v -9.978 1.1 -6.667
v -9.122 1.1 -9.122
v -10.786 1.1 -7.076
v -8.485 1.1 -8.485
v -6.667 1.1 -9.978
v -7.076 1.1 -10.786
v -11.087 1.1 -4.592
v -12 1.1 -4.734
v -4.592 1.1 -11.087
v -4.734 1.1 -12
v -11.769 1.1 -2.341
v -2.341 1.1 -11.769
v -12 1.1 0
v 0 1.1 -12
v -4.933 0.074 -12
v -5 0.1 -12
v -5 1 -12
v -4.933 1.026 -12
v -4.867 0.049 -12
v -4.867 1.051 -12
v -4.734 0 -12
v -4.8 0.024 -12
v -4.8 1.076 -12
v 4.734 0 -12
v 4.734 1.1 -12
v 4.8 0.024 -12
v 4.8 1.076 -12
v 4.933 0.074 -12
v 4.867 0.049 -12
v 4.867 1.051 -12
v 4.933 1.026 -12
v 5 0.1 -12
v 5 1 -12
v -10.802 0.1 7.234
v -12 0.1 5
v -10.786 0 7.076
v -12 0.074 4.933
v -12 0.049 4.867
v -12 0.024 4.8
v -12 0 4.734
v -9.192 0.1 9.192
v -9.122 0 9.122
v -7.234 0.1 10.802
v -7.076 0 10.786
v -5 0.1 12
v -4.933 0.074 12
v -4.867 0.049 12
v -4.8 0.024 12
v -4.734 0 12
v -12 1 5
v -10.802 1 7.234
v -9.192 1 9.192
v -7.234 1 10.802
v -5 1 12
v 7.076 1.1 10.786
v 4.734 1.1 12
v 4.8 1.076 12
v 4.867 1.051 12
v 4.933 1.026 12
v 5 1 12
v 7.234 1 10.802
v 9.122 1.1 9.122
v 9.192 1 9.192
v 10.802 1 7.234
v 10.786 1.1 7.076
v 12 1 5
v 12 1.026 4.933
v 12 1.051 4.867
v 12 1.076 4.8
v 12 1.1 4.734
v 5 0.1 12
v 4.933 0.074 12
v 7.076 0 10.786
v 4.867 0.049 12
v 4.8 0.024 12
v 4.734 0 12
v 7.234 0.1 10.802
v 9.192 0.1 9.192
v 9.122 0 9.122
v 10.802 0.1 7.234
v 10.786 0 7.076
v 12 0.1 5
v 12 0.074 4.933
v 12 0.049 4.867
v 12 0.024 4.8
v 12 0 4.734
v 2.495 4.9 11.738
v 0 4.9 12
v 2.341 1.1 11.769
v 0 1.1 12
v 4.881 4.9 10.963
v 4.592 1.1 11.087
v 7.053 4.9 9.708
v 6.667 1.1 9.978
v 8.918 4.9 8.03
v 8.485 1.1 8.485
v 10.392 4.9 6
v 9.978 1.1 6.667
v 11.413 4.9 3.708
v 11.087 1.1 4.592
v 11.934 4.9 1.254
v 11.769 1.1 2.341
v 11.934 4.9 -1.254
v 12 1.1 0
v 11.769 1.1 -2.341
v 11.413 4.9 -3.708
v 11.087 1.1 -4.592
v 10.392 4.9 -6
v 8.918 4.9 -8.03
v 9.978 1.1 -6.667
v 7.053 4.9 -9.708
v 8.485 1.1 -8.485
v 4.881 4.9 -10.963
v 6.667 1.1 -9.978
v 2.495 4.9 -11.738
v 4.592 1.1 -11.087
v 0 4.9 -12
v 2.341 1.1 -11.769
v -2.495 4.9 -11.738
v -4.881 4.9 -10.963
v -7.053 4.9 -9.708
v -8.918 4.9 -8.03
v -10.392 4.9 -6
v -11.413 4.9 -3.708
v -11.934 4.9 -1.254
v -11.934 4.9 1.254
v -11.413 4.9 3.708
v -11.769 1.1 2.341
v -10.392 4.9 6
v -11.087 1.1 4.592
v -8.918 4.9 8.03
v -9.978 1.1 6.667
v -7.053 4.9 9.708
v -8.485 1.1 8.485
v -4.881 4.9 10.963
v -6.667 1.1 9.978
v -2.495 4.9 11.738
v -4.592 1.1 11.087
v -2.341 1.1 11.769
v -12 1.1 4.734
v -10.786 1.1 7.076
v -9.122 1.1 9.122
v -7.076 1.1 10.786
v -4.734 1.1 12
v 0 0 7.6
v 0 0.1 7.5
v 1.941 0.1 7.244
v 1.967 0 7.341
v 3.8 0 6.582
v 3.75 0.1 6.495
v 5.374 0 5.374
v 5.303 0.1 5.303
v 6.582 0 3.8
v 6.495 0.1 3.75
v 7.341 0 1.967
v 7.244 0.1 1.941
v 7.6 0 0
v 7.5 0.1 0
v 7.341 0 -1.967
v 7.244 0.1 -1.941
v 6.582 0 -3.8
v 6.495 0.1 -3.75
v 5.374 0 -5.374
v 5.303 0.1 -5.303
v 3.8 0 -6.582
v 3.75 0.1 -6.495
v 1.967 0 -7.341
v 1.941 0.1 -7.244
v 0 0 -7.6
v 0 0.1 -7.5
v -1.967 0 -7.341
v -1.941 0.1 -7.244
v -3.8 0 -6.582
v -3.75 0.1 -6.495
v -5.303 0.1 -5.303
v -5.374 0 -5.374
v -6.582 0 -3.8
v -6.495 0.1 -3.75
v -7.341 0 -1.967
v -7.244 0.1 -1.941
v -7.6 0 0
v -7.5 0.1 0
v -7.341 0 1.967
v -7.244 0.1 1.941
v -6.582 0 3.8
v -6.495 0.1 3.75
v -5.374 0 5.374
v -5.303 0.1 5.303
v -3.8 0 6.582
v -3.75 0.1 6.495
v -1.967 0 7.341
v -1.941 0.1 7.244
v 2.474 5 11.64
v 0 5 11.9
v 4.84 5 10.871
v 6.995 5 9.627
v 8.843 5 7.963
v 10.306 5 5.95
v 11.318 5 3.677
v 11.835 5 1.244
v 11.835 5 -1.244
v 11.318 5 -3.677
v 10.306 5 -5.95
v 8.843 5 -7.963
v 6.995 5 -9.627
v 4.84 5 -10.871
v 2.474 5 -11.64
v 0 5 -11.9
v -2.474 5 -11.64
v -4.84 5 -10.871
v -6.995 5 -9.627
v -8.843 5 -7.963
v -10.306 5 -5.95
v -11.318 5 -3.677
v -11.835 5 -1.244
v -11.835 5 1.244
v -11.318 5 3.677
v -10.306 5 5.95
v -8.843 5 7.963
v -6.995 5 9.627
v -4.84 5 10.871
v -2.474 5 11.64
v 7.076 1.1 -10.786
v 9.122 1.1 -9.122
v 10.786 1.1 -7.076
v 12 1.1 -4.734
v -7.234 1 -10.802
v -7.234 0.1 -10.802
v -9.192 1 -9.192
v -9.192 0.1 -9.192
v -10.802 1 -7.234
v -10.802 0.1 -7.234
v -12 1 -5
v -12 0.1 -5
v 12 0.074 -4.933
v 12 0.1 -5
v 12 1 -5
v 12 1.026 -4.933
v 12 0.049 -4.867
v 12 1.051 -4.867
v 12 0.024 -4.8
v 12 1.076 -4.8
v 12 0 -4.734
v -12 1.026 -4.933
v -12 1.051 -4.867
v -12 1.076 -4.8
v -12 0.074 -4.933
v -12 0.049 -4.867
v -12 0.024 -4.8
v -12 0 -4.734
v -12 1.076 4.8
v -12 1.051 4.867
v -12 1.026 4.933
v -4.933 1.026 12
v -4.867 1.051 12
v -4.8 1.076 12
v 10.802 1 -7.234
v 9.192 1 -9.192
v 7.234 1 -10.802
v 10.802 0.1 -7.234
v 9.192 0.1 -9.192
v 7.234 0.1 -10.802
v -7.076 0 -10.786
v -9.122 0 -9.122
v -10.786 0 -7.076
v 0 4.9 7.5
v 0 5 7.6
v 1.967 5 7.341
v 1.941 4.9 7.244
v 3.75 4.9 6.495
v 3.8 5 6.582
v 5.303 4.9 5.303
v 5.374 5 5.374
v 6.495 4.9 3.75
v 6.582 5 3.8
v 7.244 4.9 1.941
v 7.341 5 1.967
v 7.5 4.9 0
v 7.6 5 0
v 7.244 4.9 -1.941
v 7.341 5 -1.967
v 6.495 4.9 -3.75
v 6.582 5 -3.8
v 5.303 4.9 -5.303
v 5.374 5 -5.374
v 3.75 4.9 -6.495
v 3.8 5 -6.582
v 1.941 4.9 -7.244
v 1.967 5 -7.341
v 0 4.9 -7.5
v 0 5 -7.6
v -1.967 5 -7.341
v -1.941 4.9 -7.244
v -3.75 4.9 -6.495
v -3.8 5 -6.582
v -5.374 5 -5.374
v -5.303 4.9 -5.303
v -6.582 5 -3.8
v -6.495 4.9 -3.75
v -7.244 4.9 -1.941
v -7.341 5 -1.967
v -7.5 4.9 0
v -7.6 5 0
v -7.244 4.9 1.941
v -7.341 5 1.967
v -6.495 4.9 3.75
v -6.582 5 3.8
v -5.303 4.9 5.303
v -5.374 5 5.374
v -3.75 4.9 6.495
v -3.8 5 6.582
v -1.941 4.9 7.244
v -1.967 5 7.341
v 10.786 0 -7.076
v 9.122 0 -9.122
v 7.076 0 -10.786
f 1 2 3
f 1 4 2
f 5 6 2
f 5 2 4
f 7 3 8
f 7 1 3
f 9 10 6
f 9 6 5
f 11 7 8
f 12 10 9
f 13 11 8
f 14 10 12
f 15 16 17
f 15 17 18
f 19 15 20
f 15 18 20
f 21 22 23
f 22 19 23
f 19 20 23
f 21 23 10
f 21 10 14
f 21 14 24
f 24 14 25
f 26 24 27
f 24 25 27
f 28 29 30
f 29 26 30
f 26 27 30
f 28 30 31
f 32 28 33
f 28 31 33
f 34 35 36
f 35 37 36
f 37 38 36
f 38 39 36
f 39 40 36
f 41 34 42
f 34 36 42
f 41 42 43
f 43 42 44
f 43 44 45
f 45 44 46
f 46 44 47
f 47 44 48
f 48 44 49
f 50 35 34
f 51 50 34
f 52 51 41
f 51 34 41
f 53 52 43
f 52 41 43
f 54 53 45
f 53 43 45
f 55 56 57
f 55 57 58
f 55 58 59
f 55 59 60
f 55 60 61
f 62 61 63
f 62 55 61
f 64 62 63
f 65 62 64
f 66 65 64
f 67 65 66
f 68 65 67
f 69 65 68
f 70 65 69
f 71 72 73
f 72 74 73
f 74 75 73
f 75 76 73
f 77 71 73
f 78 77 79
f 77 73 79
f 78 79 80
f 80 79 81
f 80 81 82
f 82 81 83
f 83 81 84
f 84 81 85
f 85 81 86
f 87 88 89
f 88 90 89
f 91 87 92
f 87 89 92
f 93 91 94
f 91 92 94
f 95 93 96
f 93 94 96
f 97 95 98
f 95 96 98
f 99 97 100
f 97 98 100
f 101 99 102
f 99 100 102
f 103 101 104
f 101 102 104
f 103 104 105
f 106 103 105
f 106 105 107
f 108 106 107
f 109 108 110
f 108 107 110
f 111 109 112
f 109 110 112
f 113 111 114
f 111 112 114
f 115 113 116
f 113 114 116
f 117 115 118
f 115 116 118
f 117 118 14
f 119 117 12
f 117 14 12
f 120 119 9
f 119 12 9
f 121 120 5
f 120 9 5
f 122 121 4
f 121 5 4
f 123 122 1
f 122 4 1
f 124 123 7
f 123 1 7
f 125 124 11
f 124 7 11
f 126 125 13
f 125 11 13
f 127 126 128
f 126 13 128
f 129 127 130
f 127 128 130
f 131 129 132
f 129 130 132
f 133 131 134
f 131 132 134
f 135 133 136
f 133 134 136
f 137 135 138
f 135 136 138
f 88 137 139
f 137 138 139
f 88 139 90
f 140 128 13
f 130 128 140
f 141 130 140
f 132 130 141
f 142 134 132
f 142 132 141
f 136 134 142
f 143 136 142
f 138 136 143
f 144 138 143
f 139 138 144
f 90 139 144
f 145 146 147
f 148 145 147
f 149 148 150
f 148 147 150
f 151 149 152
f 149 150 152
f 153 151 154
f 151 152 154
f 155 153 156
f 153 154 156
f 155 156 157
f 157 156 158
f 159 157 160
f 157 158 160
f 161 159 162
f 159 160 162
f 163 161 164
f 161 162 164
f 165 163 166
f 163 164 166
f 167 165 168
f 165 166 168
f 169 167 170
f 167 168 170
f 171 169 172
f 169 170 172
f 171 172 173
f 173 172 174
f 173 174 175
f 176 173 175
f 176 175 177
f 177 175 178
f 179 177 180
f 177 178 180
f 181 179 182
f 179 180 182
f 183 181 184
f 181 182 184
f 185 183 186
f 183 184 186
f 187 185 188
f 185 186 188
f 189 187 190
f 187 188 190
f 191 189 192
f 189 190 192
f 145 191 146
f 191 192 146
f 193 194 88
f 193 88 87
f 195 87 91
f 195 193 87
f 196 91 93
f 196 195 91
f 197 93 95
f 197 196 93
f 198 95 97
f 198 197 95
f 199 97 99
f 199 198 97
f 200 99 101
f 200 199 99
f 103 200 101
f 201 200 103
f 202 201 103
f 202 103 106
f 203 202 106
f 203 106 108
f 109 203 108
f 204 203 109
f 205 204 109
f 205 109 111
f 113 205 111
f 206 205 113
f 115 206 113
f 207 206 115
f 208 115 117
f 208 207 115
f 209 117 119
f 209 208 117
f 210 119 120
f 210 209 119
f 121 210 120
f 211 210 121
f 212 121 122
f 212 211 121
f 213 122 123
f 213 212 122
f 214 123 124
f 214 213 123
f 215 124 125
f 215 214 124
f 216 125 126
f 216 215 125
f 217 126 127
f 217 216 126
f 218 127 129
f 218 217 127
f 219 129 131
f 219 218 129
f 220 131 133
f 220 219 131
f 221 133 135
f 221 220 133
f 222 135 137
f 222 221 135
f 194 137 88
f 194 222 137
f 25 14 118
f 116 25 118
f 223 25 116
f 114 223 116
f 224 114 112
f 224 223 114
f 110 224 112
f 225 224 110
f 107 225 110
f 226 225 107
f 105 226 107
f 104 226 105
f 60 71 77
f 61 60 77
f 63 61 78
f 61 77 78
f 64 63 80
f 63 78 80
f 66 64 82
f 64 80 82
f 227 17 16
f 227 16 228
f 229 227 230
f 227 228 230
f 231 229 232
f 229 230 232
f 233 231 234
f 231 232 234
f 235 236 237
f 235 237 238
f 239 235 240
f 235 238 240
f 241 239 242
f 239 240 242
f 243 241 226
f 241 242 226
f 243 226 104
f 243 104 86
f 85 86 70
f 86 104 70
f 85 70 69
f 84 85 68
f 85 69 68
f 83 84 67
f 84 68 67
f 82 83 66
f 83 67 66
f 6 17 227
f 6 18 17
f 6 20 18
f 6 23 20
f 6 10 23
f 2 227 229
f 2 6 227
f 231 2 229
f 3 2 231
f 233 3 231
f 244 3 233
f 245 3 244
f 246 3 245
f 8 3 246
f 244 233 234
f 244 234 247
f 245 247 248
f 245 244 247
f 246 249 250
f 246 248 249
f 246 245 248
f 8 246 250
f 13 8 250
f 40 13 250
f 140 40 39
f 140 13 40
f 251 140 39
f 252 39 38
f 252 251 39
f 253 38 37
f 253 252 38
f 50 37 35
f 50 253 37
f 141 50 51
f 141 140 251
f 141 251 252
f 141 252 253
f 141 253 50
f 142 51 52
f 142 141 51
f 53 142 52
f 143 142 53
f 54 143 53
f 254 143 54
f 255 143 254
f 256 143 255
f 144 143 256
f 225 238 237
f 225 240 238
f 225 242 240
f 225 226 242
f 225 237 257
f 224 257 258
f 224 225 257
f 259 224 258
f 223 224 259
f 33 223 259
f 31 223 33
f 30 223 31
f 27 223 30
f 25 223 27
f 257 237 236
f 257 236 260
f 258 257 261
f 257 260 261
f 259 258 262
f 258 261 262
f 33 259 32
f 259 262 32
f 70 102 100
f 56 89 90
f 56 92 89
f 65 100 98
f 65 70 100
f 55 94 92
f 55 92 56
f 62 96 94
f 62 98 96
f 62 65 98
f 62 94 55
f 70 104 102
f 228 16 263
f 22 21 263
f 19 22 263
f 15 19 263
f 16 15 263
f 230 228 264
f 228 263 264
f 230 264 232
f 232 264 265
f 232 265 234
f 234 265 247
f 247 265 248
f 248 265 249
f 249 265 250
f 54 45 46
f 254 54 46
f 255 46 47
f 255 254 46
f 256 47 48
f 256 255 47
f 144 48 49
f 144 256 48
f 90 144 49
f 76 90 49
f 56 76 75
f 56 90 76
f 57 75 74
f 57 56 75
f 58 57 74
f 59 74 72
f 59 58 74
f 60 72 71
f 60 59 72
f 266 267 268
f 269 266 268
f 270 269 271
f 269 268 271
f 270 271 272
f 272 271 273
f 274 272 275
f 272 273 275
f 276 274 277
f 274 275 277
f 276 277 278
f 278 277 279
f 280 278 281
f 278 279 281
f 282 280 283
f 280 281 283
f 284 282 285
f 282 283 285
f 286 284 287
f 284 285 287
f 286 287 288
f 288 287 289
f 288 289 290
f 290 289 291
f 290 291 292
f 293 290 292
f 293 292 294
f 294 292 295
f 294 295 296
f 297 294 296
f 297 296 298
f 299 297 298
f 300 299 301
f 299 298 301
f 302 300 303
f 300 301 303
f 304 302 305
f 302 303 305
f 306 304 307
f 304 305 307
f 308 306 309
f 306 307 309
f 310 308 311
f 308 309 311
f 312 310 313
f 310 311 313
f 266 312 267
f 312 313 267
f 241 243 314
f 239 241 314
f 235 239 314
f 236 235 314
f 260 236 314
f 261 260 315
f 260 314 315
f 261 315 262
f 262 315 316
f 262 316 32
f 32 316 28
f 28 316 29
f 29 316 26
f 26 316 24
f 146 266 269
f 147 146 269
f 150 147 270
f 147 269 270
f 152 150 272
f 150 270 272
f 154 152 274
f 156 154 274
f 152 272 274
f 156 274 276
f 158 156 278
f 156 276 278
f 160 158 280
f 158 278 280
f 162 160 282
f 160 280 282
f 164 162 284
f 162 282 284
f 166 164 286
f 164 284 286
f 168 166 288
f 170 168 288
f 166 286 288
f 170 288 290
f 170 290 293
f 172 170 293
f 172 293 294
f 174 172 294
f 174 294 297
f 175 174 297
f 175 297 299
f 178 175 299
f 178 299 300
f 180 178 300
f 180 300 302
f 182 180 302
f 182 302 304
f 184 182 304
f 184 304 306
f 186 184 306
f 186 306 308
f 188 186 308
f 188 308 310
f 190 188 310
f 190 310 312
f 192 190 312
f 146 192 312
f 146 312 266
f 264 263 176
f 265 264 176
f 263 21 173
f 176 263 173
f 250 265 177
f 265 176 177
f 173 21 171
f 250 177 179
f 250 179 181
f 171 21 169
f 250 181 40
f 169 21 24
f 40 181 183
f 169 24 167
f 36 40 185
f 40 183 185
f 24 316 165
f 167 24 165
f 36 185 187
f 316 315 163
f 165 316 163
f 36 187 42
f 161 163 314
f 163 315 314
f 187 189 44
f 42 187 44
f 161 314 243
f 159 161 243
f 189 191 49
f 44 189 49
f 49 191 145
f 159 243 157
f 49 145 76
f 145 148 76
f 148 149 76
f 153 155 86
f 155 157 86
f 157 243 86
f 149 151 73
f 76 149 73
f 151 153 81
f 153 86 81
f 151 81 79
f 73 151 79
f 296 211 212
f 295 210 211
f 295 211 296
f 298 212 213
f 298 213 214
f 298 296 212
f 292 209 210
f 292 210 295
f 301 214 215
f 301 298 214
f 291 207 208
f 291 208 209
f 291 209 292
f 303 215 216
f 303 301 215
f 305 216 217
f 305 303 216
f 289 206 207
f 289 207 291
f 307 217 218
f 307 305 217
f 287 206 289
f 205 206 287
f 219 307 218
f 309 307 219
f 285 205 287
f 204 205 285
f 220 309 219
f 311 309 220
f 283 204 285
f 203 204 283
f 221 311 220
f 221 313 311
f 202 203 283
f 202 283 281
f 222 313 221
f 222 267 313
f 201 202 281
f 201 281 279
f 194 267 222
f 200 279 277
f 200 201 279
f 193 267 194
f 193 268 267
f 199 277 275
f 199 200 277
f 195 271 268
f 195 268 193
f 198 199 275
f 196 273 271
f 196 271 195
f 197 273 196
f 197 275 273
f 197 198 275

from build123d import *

# Parameters (mm, degrees)
SKETCH_1_R          = 13
EXTRUDE_1_DEPTH     = 1.1
SKETCH_2_R          = 12
EXTRUDE_2_DEPTH     = 3.9
SKETCH_3_R          = 7.5
CUT_EXTRUDE_1_DEPTH = 20.052558883
CHAMFER_1_SIZE      = 0.1
CUT_EXTRUDE_2_DEPTH = 19.793881983


with BuildPart() as part:
    # 草图1 → 凸台-拉伸1 (new body)
    with BuildSketch(Plane(origin=(0, 0, 0), x_dir=(1, 0, 0), z_dir=(0, 1, 0))):
        with Locations(Location((0, 0, 0), (0, 0, 270))):
            Circle(SKETCH_1_R)
    extrude(amount=EXTRUDE_1_DEPTH)

    # 草图2 → 凸台-拉伸2 (add)
    with BuildSketch(Plane(origin=(0, 1.1, 0), x_dir=(1, 0, 0), z_dir=(0, 1, 0))):
        with Locations(Location((0, 0, 0), (0, 0, 270))):
            Circle(SKETCH_2_R)
    extrude(amount=EXTRUDE_2_DEPTH)

    # 草图3 → 切除-拉伸1 (cut, through all)
    with BuildSketch(Plane(origin=(0, 5, 0), x_dir=(1, 0, 0), z_dir=(0, 1, 0))):
        with Locations(Location((0, 0, 0), (0, 0, 270))):
            Circle(SKETCH_3_R)
    extrude(amount=-CUT_EXTRUDE_1_DEPTH, mode=Mode.SUBTRACT)

    # 倒角1
    chamfer_1_edges = [part.edges().sort_by_distance(p)[0] for p in [
        (0, 0, -7.5),
        (0, 5, -7.5),
        (0, 0, -13),
        (0, 1.1, -13),
        (0, 5, -12),
    ]]
    chamfer(chamfer_1_edges, length=CHAMFER_1_SIZE)

    # 草图7 → 切除-拉伸2 (cut, through all)
    with BuildSketch(Plane(origin=(0, 1.1, 0), x_dir=(1, 0, 0), z_dir=(0, 1, 0))):
        with BuildLine():
            Line((-5, 12), (5, 12))
            ThreePointArc((5, 12), (0, 13), (-5, 12))
        make_face()
        with BuildLine():
            Line((-12, 5), (-12, -5))
            ThreePointArc((-12, -5), (-13, 0), (-12, 5))
        make_face()
        with BuildLine():
            Line((-5, -12), (5, -12))
            ThreePointArc((5, -12), (0, -13), (-5, -12))
        make_face()
        with BuildLine():
            Line((12, 5), (12, -5))
            ThreePointArc((12, -5), (13, 0), (12, 5))
        make_face()
    extrude(amount=-CUT_EXTRUDE_2_DEPTH, mode=Mode.SUBTRACT)


solid = part.part
